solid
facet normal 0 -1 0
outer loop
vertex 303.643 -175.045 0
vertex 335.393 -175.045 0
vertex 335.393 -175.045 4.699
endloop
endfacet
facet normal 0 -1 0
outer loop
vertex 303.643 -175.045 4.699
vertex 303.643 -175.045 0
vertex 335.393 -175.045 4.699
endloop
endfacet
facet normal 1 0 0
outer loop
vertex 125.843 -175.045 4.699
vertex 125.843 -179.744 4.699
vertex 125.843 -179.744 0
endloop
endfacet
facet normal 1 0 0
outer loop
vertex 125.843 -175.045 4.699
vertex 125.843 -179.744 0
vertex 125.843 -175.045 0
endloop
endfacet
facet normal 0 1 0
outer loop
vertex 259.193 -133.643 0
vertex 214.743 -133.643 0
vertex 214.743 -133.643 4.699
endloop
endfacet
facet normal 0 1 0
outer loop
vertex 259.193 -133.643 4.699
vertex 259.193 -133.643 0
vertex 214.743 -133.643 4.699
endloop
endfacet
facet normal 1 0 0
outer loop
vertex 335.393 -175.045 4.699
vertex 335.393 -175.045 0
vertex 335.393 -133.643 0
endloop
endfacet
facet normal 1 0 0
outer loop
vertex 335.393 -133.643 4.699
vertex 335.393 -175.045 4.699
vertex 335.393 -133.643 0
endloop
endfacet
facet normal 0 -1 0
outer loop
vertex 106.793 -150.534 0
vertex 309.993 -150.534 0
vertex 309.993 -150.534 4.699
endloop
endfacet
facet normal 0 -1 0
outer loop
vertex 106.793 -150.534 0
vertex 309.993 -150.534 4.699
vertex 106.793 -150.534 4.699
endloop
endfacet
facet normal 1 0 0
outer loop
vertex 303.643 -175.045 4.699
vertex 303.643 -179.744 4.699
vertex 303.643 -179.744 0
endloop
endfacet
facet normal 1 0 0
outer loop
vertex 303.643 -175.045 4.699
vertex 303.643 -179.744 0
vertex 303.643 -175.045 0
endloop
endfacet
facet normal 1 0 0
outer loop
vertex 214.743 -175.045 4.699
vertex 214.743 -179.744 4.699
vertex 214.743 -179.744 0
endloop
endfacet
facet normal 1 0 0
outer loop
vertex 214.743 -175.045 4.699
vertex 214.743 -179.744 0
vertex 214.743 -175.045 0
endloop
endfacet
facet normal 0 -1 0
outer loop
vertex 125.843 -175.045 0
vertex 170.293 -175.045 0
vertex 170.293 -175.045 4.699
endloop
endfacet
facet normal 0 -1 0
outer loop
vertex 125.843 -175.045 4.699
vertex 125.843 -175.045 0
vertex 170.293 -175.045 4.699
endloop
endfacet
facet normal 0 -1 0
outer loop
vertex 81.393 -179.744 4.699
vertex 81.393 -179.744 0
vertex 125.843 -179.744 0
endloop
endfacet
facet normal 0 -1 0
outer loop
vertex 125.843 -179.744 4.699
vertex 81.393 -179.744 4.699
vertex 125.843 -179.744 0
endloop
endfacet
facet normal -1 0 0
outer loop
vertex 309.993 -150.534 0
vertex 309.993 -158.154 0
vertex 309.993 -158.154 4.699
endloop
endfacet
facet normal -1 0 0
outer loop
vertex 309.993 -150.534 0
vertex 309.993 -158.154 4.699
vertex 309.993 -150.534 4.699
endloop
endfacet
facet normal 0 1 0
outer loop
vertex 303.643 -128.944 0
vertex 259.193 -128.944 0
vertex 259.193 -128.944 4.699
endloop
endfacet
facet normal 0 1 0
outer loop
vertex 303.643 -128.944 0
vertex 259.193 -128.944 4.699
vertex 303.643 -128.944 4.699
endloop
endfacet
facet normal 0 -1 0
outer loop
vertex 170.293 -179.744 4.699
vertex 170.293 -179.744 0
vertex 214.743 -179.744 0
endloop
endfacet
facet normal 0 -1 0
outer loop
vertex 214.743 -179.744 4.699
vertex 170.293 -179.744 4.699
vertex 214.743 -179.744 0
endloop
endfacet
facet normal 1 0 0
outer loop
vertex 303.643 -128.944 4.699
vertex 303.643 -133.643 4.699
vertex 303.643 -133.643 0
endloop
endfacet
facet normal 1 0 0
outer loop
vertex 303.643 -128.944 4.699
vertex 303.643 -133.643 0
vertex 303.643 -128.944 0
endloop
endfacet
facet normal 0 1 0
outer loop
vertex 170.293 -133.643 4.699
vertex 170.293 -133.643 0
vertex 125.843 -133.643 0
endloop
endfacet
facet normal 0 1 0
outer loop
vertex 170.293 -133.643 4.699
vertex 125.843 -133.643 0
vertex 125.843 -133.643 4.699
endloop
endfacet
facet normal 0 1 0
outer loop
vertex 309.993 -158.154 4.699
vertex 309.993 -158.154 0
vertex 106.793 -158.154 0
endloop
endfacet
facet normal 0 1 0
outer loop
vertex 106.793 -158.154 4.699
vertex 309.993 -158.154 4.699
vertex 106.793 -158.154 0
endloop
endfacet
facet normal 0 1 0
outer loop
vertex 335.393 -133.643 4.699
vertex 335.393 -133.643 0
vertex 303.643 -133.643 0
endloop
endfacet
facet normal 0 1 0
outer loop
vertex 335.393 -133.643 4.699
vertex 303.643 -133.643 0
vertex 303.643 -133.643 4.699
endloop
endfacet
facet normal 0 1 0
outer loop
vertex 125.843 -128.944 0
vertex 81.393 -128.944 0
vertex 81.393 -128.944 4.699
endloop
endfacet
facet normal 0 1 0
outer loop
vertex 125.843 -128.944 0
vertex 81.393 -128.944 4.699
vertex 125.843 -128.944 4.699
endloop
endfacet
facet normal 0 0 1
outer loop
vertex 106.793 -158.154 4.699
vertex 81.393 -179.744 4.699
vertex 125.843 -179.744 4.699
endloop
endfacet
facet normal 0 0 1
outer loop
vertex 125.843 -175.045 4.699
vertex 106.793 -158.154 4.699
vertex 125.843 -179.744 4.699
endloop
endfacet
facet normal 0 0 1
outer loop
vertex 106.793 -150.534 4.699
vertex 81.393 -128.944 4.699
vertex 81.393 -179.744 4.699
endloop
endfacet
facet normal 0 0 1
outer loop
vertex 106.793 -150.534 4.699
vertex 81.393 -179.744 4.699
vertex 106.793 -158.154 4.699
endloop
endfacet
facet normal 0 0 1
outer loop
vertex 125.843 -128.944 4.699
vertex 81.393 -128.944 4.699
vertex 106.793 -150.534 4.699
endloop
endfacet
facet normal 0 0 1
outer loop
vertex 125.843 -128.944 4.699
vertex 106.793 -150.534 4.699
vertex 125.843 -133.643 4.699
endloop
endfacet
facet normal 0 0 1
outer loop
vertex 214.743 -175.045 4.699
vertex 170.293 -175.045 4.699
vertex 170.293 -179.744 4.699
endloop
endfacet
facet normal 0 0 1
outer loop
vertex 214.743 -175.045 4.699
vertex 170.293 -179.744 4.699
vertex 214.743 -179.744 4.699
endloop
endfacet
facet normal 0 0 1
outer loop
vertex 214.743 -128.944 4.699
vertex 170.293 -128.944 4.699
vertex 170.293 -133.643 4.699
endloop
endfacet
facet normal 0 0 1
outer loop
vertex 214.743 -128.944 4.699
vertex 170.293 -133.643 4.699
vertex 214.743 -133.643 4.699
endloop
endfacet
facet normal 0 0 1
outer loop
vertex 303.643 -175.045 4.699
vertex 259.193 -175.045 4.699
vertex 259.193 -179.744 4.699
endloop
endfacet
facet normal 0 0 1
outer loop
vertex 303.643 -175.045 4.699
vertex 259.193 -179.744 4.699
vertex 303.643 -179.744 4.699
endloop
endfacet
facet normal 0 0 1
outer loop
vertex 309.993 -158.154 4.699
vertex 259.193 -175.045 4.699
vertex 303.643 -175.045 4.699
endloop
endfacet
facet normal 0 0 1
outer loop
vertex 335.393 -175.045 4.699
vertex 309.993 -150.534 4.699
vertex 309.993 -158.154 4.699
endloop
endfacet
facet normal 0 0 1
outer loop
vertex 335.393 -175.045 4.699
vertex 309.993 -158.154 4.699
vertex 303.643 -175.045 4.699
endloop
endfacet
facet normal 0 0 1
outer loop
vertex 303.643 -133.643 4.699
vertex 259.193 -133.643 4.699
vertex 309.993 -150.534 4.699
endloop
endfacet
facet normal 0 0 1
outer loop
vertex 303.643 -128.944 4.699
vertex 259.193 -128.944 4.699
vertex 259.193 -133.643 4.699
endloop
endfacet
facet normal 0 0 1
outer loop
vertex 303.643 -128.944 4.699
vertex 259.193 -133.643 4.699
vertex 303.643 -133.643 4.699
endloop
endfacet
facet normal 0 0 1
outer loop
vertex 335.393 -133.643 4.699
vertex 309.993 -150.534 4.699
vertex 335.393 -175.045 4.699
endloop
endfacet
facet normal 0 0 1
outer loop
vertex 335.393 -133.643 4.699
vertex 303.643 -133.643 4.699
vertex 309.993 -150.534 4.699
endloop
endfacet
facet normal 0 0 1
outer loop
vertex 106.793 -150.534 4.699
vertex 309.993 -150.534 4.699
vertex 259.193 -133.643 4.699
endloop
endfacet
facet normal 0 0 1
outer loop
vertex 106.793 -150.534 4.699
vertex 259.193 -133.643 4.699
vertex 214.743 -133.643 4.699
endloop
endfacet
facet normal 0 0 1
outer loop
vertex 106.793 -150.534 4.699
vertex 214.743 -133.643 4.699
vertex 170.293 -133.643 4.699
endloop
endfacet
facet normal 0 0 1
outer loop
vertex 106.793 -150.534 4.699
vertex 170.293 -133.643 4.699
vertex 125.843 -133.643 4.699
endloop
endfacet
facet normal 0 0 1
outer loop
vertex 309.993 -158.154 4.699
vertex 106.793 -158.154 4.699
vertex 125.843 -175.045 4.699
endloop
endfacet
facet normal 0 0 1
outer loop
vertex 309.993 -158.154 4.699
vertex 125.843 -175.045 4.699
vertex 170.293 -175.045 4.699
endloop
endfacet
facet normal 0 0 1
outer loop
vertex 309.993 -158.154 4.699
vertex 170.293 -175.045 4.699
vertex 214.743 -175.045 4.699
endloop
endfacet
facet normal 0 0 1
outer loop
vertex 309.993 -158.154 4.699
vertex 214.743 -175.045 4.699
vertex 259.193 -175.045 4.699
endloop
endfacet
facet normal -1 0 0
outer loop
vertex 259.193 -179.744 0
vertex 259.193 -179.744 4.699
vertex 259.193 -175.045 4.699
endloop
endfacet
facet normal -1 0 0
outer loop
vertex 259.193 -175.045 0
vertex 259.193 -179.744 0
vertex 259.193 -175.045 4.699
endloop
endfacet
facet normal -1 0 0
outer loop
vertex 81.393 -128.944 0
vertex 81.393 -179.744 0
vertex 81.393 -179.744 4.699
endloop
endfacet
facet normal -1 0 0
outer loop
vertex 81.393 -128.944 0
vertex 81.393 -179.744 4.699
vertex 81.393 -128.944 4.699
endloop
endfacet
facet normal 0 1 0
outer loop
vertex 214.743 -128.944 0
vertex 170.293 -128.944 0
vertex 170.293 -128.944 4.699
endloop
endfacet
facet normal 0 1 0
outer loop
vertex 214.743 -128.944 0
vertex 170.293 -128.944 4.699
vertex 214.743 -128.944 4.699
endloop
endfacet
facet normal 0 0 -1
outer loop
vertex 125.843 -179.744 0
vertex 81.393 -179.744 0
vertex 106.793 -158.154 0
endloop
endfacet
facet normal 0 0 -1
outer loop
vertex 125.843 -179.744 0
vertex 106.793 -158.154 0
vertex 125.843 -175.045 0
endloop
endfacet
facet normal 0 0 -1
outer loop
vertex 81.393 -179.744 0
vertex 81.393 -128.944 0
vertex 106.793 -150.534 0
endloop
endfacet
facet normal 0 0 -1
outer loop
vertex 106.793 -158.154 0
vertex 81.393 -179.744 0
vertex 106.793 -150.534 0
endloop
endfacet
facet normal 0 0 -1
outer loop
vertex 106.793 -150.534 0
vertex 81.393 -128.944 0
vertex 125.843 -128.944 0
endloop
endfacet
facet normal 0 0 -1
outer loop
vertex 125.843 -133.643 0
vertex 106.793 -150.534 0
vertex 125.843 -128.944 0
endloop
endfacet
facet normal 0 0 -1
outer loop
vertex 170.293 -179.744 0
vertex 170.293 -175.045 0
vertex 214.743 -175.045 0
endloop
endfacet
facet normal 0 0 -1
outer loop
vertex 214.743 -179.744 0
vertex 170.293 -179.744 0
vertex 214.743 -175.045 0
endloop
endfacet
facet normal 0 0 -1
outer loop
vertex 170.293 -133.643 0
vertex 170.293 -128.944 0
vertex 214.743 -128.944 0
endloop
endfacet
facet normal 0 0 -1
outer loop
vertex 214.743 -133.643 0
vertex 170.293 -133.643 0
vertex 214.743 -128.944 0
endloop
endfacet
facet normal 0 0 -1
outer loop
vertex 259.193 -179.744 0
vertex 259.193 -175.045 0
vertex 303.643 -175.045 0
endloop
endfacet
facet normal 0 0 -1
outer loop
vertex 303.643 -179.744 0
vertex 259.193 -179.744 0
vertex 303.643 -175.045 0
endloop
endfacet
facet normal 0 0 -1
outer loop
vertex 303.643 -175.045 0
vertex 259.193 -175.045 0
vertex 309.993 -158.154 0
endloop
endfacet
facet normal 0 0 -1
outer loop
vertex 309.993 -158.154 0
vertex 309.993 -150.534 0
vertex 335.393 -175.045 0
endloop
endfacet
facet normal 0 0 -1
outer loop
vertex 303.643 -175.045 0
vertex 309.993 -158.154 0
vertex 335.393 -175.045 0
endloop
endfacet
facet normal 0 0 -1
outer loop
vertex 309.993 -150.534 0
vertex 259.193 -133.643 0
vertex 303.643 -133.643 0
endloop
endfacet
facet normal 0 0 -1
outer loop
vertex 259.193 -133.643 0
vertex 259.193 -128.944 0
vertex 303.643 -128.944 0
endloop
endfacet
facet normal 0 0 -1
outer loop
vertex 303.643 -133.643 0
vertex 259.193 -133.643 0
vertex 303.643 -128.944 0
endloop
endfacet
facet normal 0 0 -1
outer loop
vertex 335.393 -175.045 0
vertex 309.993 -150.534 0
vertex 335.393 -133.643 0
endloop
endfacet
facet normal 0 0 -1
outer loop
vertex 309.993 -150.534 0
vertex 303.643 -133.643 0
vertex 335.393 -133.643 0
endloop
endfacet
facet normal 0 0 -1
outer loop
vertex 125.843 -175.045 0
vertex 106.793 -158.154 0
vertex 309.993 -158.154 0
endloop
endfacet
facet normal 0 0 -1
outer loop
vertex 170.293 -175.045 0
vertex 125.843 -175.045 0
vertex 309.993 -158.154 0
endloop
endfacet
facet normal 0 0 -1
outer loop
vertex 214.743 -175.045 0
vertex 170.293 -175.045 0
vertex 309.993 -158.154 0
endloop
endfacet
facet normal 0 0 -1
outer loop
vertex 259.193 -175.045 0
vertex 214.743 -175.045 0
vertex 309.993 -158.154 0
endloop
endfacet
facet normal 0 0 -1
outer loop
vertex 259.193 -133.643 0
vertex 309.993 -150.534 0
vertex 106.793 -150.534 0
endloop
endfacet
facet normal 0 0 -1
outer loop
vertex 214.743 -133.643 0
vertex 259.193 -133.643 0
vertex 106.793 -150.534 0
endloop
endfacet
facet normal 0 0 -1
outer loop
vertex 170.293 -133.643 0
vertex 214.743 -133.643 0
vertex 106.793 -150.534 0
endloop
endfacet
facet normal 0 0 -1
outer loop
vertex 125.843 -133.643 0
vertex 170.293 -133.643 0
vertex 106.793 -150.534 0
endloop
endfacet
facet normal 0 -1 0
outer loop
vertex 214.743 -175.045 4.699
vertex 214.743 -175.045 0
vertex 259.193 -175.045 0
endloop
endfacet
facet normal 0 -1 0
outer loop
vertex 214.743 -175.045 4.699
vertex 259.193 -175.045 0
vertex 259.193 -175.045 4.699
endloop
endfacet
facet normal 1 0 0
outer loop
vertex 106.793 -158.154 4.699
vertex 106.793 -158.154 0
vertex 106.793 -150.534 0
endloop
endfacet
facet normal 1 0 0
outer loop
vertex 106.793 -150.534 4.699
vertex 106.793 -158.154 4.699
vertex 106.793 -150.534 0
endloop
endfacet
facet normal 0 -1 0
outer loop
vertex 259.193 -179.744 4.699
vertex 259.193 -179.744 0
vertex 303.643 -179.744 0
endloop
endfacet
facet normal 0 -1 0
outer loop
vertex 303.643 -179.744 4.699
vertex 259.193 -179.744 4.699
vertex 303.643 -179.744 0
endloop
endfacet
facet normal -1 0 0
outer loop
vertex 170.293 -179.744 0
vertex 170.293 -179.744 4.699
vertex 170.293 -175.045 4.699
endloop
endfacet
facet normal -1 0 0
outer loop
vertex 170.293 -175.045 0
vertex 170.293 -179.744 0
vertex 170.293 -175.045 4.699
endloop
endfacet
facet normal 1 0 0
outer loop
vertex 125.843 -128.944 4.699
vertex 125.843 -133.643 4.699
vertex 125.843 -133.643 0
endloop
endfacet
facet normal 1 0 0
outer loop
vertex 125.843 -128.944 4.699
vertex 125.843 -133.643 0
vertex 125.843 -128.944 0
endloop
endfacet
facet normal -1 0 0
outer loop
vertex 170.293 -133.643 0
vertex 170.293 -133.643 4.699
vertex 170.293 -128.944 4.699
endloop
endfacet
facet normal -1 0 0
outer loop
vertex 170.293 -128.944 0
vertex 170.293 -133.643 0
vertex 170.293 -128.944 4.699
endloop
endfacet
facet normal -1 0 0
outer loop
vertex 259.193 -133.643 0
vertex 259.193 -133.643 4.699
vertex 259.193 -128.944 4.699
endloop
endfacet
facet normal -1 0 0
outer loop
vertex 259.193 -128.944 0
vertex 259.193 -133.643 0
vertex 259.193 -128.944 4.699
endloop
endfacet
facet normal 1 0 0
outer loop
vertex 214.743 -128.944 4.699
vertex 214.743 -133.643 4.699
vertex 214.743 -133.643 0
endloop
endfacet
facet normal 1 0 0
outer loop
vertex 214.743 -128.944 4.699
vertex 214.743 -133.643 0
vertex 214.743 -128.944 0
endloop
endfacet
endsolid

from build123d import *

# Parameters (mm, degrees)
SKETCH1_W           = 254
SKETCH1_H           = 50.8
BOSS_EXTRUDE1_DEPTH = 4.699
SKETCH2_W           = 203.2
SKETCH2_H           = 7.62
CUT_EXTRUDE1_DEPTH  = 381.549968508
CAVITY1_START       = 125.842884167
CAVITY1_OUTLINE_W   = 4.699
CAVITY1_OUTLINE_H   = 4.699
CAVITY1_DEPTH       = 44.45
CAVITY1_START_2     = 214.742884167
CAVITY1_2_OUTLINE_W = 4.699
CAVITY1_2_OUTLINE_H = 4.699
CAVITY1_2_DEPTH     = 44.45
CAVITY1_START_3     = 303.642884167
CAVITY1_3_OUTLINE_W = 4.699
CAVITY1_3_OUTLINE_H = 4.699
CAVITY1_3_DEPTH     = 31.75


# Read off the part's stored shape, not the designer's step: Cavity1
with BuildPart() as part:
    # Sketch1 → Boss-Extrude1 (new body)
    with BuildSketch(Plane.XY):
        with Locations((208.392884167, -154.343737527)):
            Rectangle(SKETCH1_W, SKETCH1_H)
    extrude(amount=BOSS_EXTRUDE1_DEPTH)

    # Sketch2 → Cut-Extrude1 (cut, through all)
    with BuildSketch(Plane(origin=(0, 0, 0), x_dir=(-1, 0, 0), z_dir=(0, 0, -1))):
        with Locations((-208.392884167, -154.343737527)):
            Rectangle(SKETCH2_W, SKETCH2_H)
    extrude(amount=-CUT_EXTRUDE1_DEPTH, mode=Mode.SUBTRACT)

    # Cavity1 outline → Cavity1 (cut)
    with BuildSketch(Plane.YZ.offset(CAVITY1_START)):
        with Locations((-177.394237527, 2.3495)):
            Rectangle(CAVITY1_OUTLINE_W, CAVITY1_OUTLINE_H)
        with Locations((-131.293237527, 2.3495)):
            Rectangle(CAVITY1_OUTLINE_W, CAVITY1_OUTLINE_H)
    extrude(amount=CAVITY1_DEPTH, mode=Mode.SUBTRACT)

    # Cavity1 2 outline → Cavity1 2 (cut)
    with BuildSketch(Plane.YZ.offset(CAVITY1_START_2)):
        with Locations((-177.394237527, 2.3495)):
            Rectangle(CAVITY1_2_OUTLINE_W, CAVITY1_2_OUTLINE_H)
        with Locations((-131.293237527, 2.3495)):
            Rectangle(CAVITY1_2_OUTLINE_W, CAVITY1_2_OUTLINE_H)
    extrude(amount=CAVITY1_2_DEPTH, mode=Mode.SUBTRACT)

    # Cavity1 3 outline → Cavity1 3 (cut)
    with BuildSketch(Plane.YZ.offset(CAVITY1_START_3)):
        with Locations((-177.394237527, 2.3495)):
            Rectangle(CAVITY1_3_OUTLINE_W, CAVITY1_3_OUTLINE_H)
        with Locations((-131.293237527, 2.3495)):
            Rectangle(CAVITY1_3_OUTLINE_W, CAVITY1_3_OUTLINE_H)
    extrude(amount=CAVITY1_3_DEPTH, mode=Mode.SUBTRACT)


solid = part.part
